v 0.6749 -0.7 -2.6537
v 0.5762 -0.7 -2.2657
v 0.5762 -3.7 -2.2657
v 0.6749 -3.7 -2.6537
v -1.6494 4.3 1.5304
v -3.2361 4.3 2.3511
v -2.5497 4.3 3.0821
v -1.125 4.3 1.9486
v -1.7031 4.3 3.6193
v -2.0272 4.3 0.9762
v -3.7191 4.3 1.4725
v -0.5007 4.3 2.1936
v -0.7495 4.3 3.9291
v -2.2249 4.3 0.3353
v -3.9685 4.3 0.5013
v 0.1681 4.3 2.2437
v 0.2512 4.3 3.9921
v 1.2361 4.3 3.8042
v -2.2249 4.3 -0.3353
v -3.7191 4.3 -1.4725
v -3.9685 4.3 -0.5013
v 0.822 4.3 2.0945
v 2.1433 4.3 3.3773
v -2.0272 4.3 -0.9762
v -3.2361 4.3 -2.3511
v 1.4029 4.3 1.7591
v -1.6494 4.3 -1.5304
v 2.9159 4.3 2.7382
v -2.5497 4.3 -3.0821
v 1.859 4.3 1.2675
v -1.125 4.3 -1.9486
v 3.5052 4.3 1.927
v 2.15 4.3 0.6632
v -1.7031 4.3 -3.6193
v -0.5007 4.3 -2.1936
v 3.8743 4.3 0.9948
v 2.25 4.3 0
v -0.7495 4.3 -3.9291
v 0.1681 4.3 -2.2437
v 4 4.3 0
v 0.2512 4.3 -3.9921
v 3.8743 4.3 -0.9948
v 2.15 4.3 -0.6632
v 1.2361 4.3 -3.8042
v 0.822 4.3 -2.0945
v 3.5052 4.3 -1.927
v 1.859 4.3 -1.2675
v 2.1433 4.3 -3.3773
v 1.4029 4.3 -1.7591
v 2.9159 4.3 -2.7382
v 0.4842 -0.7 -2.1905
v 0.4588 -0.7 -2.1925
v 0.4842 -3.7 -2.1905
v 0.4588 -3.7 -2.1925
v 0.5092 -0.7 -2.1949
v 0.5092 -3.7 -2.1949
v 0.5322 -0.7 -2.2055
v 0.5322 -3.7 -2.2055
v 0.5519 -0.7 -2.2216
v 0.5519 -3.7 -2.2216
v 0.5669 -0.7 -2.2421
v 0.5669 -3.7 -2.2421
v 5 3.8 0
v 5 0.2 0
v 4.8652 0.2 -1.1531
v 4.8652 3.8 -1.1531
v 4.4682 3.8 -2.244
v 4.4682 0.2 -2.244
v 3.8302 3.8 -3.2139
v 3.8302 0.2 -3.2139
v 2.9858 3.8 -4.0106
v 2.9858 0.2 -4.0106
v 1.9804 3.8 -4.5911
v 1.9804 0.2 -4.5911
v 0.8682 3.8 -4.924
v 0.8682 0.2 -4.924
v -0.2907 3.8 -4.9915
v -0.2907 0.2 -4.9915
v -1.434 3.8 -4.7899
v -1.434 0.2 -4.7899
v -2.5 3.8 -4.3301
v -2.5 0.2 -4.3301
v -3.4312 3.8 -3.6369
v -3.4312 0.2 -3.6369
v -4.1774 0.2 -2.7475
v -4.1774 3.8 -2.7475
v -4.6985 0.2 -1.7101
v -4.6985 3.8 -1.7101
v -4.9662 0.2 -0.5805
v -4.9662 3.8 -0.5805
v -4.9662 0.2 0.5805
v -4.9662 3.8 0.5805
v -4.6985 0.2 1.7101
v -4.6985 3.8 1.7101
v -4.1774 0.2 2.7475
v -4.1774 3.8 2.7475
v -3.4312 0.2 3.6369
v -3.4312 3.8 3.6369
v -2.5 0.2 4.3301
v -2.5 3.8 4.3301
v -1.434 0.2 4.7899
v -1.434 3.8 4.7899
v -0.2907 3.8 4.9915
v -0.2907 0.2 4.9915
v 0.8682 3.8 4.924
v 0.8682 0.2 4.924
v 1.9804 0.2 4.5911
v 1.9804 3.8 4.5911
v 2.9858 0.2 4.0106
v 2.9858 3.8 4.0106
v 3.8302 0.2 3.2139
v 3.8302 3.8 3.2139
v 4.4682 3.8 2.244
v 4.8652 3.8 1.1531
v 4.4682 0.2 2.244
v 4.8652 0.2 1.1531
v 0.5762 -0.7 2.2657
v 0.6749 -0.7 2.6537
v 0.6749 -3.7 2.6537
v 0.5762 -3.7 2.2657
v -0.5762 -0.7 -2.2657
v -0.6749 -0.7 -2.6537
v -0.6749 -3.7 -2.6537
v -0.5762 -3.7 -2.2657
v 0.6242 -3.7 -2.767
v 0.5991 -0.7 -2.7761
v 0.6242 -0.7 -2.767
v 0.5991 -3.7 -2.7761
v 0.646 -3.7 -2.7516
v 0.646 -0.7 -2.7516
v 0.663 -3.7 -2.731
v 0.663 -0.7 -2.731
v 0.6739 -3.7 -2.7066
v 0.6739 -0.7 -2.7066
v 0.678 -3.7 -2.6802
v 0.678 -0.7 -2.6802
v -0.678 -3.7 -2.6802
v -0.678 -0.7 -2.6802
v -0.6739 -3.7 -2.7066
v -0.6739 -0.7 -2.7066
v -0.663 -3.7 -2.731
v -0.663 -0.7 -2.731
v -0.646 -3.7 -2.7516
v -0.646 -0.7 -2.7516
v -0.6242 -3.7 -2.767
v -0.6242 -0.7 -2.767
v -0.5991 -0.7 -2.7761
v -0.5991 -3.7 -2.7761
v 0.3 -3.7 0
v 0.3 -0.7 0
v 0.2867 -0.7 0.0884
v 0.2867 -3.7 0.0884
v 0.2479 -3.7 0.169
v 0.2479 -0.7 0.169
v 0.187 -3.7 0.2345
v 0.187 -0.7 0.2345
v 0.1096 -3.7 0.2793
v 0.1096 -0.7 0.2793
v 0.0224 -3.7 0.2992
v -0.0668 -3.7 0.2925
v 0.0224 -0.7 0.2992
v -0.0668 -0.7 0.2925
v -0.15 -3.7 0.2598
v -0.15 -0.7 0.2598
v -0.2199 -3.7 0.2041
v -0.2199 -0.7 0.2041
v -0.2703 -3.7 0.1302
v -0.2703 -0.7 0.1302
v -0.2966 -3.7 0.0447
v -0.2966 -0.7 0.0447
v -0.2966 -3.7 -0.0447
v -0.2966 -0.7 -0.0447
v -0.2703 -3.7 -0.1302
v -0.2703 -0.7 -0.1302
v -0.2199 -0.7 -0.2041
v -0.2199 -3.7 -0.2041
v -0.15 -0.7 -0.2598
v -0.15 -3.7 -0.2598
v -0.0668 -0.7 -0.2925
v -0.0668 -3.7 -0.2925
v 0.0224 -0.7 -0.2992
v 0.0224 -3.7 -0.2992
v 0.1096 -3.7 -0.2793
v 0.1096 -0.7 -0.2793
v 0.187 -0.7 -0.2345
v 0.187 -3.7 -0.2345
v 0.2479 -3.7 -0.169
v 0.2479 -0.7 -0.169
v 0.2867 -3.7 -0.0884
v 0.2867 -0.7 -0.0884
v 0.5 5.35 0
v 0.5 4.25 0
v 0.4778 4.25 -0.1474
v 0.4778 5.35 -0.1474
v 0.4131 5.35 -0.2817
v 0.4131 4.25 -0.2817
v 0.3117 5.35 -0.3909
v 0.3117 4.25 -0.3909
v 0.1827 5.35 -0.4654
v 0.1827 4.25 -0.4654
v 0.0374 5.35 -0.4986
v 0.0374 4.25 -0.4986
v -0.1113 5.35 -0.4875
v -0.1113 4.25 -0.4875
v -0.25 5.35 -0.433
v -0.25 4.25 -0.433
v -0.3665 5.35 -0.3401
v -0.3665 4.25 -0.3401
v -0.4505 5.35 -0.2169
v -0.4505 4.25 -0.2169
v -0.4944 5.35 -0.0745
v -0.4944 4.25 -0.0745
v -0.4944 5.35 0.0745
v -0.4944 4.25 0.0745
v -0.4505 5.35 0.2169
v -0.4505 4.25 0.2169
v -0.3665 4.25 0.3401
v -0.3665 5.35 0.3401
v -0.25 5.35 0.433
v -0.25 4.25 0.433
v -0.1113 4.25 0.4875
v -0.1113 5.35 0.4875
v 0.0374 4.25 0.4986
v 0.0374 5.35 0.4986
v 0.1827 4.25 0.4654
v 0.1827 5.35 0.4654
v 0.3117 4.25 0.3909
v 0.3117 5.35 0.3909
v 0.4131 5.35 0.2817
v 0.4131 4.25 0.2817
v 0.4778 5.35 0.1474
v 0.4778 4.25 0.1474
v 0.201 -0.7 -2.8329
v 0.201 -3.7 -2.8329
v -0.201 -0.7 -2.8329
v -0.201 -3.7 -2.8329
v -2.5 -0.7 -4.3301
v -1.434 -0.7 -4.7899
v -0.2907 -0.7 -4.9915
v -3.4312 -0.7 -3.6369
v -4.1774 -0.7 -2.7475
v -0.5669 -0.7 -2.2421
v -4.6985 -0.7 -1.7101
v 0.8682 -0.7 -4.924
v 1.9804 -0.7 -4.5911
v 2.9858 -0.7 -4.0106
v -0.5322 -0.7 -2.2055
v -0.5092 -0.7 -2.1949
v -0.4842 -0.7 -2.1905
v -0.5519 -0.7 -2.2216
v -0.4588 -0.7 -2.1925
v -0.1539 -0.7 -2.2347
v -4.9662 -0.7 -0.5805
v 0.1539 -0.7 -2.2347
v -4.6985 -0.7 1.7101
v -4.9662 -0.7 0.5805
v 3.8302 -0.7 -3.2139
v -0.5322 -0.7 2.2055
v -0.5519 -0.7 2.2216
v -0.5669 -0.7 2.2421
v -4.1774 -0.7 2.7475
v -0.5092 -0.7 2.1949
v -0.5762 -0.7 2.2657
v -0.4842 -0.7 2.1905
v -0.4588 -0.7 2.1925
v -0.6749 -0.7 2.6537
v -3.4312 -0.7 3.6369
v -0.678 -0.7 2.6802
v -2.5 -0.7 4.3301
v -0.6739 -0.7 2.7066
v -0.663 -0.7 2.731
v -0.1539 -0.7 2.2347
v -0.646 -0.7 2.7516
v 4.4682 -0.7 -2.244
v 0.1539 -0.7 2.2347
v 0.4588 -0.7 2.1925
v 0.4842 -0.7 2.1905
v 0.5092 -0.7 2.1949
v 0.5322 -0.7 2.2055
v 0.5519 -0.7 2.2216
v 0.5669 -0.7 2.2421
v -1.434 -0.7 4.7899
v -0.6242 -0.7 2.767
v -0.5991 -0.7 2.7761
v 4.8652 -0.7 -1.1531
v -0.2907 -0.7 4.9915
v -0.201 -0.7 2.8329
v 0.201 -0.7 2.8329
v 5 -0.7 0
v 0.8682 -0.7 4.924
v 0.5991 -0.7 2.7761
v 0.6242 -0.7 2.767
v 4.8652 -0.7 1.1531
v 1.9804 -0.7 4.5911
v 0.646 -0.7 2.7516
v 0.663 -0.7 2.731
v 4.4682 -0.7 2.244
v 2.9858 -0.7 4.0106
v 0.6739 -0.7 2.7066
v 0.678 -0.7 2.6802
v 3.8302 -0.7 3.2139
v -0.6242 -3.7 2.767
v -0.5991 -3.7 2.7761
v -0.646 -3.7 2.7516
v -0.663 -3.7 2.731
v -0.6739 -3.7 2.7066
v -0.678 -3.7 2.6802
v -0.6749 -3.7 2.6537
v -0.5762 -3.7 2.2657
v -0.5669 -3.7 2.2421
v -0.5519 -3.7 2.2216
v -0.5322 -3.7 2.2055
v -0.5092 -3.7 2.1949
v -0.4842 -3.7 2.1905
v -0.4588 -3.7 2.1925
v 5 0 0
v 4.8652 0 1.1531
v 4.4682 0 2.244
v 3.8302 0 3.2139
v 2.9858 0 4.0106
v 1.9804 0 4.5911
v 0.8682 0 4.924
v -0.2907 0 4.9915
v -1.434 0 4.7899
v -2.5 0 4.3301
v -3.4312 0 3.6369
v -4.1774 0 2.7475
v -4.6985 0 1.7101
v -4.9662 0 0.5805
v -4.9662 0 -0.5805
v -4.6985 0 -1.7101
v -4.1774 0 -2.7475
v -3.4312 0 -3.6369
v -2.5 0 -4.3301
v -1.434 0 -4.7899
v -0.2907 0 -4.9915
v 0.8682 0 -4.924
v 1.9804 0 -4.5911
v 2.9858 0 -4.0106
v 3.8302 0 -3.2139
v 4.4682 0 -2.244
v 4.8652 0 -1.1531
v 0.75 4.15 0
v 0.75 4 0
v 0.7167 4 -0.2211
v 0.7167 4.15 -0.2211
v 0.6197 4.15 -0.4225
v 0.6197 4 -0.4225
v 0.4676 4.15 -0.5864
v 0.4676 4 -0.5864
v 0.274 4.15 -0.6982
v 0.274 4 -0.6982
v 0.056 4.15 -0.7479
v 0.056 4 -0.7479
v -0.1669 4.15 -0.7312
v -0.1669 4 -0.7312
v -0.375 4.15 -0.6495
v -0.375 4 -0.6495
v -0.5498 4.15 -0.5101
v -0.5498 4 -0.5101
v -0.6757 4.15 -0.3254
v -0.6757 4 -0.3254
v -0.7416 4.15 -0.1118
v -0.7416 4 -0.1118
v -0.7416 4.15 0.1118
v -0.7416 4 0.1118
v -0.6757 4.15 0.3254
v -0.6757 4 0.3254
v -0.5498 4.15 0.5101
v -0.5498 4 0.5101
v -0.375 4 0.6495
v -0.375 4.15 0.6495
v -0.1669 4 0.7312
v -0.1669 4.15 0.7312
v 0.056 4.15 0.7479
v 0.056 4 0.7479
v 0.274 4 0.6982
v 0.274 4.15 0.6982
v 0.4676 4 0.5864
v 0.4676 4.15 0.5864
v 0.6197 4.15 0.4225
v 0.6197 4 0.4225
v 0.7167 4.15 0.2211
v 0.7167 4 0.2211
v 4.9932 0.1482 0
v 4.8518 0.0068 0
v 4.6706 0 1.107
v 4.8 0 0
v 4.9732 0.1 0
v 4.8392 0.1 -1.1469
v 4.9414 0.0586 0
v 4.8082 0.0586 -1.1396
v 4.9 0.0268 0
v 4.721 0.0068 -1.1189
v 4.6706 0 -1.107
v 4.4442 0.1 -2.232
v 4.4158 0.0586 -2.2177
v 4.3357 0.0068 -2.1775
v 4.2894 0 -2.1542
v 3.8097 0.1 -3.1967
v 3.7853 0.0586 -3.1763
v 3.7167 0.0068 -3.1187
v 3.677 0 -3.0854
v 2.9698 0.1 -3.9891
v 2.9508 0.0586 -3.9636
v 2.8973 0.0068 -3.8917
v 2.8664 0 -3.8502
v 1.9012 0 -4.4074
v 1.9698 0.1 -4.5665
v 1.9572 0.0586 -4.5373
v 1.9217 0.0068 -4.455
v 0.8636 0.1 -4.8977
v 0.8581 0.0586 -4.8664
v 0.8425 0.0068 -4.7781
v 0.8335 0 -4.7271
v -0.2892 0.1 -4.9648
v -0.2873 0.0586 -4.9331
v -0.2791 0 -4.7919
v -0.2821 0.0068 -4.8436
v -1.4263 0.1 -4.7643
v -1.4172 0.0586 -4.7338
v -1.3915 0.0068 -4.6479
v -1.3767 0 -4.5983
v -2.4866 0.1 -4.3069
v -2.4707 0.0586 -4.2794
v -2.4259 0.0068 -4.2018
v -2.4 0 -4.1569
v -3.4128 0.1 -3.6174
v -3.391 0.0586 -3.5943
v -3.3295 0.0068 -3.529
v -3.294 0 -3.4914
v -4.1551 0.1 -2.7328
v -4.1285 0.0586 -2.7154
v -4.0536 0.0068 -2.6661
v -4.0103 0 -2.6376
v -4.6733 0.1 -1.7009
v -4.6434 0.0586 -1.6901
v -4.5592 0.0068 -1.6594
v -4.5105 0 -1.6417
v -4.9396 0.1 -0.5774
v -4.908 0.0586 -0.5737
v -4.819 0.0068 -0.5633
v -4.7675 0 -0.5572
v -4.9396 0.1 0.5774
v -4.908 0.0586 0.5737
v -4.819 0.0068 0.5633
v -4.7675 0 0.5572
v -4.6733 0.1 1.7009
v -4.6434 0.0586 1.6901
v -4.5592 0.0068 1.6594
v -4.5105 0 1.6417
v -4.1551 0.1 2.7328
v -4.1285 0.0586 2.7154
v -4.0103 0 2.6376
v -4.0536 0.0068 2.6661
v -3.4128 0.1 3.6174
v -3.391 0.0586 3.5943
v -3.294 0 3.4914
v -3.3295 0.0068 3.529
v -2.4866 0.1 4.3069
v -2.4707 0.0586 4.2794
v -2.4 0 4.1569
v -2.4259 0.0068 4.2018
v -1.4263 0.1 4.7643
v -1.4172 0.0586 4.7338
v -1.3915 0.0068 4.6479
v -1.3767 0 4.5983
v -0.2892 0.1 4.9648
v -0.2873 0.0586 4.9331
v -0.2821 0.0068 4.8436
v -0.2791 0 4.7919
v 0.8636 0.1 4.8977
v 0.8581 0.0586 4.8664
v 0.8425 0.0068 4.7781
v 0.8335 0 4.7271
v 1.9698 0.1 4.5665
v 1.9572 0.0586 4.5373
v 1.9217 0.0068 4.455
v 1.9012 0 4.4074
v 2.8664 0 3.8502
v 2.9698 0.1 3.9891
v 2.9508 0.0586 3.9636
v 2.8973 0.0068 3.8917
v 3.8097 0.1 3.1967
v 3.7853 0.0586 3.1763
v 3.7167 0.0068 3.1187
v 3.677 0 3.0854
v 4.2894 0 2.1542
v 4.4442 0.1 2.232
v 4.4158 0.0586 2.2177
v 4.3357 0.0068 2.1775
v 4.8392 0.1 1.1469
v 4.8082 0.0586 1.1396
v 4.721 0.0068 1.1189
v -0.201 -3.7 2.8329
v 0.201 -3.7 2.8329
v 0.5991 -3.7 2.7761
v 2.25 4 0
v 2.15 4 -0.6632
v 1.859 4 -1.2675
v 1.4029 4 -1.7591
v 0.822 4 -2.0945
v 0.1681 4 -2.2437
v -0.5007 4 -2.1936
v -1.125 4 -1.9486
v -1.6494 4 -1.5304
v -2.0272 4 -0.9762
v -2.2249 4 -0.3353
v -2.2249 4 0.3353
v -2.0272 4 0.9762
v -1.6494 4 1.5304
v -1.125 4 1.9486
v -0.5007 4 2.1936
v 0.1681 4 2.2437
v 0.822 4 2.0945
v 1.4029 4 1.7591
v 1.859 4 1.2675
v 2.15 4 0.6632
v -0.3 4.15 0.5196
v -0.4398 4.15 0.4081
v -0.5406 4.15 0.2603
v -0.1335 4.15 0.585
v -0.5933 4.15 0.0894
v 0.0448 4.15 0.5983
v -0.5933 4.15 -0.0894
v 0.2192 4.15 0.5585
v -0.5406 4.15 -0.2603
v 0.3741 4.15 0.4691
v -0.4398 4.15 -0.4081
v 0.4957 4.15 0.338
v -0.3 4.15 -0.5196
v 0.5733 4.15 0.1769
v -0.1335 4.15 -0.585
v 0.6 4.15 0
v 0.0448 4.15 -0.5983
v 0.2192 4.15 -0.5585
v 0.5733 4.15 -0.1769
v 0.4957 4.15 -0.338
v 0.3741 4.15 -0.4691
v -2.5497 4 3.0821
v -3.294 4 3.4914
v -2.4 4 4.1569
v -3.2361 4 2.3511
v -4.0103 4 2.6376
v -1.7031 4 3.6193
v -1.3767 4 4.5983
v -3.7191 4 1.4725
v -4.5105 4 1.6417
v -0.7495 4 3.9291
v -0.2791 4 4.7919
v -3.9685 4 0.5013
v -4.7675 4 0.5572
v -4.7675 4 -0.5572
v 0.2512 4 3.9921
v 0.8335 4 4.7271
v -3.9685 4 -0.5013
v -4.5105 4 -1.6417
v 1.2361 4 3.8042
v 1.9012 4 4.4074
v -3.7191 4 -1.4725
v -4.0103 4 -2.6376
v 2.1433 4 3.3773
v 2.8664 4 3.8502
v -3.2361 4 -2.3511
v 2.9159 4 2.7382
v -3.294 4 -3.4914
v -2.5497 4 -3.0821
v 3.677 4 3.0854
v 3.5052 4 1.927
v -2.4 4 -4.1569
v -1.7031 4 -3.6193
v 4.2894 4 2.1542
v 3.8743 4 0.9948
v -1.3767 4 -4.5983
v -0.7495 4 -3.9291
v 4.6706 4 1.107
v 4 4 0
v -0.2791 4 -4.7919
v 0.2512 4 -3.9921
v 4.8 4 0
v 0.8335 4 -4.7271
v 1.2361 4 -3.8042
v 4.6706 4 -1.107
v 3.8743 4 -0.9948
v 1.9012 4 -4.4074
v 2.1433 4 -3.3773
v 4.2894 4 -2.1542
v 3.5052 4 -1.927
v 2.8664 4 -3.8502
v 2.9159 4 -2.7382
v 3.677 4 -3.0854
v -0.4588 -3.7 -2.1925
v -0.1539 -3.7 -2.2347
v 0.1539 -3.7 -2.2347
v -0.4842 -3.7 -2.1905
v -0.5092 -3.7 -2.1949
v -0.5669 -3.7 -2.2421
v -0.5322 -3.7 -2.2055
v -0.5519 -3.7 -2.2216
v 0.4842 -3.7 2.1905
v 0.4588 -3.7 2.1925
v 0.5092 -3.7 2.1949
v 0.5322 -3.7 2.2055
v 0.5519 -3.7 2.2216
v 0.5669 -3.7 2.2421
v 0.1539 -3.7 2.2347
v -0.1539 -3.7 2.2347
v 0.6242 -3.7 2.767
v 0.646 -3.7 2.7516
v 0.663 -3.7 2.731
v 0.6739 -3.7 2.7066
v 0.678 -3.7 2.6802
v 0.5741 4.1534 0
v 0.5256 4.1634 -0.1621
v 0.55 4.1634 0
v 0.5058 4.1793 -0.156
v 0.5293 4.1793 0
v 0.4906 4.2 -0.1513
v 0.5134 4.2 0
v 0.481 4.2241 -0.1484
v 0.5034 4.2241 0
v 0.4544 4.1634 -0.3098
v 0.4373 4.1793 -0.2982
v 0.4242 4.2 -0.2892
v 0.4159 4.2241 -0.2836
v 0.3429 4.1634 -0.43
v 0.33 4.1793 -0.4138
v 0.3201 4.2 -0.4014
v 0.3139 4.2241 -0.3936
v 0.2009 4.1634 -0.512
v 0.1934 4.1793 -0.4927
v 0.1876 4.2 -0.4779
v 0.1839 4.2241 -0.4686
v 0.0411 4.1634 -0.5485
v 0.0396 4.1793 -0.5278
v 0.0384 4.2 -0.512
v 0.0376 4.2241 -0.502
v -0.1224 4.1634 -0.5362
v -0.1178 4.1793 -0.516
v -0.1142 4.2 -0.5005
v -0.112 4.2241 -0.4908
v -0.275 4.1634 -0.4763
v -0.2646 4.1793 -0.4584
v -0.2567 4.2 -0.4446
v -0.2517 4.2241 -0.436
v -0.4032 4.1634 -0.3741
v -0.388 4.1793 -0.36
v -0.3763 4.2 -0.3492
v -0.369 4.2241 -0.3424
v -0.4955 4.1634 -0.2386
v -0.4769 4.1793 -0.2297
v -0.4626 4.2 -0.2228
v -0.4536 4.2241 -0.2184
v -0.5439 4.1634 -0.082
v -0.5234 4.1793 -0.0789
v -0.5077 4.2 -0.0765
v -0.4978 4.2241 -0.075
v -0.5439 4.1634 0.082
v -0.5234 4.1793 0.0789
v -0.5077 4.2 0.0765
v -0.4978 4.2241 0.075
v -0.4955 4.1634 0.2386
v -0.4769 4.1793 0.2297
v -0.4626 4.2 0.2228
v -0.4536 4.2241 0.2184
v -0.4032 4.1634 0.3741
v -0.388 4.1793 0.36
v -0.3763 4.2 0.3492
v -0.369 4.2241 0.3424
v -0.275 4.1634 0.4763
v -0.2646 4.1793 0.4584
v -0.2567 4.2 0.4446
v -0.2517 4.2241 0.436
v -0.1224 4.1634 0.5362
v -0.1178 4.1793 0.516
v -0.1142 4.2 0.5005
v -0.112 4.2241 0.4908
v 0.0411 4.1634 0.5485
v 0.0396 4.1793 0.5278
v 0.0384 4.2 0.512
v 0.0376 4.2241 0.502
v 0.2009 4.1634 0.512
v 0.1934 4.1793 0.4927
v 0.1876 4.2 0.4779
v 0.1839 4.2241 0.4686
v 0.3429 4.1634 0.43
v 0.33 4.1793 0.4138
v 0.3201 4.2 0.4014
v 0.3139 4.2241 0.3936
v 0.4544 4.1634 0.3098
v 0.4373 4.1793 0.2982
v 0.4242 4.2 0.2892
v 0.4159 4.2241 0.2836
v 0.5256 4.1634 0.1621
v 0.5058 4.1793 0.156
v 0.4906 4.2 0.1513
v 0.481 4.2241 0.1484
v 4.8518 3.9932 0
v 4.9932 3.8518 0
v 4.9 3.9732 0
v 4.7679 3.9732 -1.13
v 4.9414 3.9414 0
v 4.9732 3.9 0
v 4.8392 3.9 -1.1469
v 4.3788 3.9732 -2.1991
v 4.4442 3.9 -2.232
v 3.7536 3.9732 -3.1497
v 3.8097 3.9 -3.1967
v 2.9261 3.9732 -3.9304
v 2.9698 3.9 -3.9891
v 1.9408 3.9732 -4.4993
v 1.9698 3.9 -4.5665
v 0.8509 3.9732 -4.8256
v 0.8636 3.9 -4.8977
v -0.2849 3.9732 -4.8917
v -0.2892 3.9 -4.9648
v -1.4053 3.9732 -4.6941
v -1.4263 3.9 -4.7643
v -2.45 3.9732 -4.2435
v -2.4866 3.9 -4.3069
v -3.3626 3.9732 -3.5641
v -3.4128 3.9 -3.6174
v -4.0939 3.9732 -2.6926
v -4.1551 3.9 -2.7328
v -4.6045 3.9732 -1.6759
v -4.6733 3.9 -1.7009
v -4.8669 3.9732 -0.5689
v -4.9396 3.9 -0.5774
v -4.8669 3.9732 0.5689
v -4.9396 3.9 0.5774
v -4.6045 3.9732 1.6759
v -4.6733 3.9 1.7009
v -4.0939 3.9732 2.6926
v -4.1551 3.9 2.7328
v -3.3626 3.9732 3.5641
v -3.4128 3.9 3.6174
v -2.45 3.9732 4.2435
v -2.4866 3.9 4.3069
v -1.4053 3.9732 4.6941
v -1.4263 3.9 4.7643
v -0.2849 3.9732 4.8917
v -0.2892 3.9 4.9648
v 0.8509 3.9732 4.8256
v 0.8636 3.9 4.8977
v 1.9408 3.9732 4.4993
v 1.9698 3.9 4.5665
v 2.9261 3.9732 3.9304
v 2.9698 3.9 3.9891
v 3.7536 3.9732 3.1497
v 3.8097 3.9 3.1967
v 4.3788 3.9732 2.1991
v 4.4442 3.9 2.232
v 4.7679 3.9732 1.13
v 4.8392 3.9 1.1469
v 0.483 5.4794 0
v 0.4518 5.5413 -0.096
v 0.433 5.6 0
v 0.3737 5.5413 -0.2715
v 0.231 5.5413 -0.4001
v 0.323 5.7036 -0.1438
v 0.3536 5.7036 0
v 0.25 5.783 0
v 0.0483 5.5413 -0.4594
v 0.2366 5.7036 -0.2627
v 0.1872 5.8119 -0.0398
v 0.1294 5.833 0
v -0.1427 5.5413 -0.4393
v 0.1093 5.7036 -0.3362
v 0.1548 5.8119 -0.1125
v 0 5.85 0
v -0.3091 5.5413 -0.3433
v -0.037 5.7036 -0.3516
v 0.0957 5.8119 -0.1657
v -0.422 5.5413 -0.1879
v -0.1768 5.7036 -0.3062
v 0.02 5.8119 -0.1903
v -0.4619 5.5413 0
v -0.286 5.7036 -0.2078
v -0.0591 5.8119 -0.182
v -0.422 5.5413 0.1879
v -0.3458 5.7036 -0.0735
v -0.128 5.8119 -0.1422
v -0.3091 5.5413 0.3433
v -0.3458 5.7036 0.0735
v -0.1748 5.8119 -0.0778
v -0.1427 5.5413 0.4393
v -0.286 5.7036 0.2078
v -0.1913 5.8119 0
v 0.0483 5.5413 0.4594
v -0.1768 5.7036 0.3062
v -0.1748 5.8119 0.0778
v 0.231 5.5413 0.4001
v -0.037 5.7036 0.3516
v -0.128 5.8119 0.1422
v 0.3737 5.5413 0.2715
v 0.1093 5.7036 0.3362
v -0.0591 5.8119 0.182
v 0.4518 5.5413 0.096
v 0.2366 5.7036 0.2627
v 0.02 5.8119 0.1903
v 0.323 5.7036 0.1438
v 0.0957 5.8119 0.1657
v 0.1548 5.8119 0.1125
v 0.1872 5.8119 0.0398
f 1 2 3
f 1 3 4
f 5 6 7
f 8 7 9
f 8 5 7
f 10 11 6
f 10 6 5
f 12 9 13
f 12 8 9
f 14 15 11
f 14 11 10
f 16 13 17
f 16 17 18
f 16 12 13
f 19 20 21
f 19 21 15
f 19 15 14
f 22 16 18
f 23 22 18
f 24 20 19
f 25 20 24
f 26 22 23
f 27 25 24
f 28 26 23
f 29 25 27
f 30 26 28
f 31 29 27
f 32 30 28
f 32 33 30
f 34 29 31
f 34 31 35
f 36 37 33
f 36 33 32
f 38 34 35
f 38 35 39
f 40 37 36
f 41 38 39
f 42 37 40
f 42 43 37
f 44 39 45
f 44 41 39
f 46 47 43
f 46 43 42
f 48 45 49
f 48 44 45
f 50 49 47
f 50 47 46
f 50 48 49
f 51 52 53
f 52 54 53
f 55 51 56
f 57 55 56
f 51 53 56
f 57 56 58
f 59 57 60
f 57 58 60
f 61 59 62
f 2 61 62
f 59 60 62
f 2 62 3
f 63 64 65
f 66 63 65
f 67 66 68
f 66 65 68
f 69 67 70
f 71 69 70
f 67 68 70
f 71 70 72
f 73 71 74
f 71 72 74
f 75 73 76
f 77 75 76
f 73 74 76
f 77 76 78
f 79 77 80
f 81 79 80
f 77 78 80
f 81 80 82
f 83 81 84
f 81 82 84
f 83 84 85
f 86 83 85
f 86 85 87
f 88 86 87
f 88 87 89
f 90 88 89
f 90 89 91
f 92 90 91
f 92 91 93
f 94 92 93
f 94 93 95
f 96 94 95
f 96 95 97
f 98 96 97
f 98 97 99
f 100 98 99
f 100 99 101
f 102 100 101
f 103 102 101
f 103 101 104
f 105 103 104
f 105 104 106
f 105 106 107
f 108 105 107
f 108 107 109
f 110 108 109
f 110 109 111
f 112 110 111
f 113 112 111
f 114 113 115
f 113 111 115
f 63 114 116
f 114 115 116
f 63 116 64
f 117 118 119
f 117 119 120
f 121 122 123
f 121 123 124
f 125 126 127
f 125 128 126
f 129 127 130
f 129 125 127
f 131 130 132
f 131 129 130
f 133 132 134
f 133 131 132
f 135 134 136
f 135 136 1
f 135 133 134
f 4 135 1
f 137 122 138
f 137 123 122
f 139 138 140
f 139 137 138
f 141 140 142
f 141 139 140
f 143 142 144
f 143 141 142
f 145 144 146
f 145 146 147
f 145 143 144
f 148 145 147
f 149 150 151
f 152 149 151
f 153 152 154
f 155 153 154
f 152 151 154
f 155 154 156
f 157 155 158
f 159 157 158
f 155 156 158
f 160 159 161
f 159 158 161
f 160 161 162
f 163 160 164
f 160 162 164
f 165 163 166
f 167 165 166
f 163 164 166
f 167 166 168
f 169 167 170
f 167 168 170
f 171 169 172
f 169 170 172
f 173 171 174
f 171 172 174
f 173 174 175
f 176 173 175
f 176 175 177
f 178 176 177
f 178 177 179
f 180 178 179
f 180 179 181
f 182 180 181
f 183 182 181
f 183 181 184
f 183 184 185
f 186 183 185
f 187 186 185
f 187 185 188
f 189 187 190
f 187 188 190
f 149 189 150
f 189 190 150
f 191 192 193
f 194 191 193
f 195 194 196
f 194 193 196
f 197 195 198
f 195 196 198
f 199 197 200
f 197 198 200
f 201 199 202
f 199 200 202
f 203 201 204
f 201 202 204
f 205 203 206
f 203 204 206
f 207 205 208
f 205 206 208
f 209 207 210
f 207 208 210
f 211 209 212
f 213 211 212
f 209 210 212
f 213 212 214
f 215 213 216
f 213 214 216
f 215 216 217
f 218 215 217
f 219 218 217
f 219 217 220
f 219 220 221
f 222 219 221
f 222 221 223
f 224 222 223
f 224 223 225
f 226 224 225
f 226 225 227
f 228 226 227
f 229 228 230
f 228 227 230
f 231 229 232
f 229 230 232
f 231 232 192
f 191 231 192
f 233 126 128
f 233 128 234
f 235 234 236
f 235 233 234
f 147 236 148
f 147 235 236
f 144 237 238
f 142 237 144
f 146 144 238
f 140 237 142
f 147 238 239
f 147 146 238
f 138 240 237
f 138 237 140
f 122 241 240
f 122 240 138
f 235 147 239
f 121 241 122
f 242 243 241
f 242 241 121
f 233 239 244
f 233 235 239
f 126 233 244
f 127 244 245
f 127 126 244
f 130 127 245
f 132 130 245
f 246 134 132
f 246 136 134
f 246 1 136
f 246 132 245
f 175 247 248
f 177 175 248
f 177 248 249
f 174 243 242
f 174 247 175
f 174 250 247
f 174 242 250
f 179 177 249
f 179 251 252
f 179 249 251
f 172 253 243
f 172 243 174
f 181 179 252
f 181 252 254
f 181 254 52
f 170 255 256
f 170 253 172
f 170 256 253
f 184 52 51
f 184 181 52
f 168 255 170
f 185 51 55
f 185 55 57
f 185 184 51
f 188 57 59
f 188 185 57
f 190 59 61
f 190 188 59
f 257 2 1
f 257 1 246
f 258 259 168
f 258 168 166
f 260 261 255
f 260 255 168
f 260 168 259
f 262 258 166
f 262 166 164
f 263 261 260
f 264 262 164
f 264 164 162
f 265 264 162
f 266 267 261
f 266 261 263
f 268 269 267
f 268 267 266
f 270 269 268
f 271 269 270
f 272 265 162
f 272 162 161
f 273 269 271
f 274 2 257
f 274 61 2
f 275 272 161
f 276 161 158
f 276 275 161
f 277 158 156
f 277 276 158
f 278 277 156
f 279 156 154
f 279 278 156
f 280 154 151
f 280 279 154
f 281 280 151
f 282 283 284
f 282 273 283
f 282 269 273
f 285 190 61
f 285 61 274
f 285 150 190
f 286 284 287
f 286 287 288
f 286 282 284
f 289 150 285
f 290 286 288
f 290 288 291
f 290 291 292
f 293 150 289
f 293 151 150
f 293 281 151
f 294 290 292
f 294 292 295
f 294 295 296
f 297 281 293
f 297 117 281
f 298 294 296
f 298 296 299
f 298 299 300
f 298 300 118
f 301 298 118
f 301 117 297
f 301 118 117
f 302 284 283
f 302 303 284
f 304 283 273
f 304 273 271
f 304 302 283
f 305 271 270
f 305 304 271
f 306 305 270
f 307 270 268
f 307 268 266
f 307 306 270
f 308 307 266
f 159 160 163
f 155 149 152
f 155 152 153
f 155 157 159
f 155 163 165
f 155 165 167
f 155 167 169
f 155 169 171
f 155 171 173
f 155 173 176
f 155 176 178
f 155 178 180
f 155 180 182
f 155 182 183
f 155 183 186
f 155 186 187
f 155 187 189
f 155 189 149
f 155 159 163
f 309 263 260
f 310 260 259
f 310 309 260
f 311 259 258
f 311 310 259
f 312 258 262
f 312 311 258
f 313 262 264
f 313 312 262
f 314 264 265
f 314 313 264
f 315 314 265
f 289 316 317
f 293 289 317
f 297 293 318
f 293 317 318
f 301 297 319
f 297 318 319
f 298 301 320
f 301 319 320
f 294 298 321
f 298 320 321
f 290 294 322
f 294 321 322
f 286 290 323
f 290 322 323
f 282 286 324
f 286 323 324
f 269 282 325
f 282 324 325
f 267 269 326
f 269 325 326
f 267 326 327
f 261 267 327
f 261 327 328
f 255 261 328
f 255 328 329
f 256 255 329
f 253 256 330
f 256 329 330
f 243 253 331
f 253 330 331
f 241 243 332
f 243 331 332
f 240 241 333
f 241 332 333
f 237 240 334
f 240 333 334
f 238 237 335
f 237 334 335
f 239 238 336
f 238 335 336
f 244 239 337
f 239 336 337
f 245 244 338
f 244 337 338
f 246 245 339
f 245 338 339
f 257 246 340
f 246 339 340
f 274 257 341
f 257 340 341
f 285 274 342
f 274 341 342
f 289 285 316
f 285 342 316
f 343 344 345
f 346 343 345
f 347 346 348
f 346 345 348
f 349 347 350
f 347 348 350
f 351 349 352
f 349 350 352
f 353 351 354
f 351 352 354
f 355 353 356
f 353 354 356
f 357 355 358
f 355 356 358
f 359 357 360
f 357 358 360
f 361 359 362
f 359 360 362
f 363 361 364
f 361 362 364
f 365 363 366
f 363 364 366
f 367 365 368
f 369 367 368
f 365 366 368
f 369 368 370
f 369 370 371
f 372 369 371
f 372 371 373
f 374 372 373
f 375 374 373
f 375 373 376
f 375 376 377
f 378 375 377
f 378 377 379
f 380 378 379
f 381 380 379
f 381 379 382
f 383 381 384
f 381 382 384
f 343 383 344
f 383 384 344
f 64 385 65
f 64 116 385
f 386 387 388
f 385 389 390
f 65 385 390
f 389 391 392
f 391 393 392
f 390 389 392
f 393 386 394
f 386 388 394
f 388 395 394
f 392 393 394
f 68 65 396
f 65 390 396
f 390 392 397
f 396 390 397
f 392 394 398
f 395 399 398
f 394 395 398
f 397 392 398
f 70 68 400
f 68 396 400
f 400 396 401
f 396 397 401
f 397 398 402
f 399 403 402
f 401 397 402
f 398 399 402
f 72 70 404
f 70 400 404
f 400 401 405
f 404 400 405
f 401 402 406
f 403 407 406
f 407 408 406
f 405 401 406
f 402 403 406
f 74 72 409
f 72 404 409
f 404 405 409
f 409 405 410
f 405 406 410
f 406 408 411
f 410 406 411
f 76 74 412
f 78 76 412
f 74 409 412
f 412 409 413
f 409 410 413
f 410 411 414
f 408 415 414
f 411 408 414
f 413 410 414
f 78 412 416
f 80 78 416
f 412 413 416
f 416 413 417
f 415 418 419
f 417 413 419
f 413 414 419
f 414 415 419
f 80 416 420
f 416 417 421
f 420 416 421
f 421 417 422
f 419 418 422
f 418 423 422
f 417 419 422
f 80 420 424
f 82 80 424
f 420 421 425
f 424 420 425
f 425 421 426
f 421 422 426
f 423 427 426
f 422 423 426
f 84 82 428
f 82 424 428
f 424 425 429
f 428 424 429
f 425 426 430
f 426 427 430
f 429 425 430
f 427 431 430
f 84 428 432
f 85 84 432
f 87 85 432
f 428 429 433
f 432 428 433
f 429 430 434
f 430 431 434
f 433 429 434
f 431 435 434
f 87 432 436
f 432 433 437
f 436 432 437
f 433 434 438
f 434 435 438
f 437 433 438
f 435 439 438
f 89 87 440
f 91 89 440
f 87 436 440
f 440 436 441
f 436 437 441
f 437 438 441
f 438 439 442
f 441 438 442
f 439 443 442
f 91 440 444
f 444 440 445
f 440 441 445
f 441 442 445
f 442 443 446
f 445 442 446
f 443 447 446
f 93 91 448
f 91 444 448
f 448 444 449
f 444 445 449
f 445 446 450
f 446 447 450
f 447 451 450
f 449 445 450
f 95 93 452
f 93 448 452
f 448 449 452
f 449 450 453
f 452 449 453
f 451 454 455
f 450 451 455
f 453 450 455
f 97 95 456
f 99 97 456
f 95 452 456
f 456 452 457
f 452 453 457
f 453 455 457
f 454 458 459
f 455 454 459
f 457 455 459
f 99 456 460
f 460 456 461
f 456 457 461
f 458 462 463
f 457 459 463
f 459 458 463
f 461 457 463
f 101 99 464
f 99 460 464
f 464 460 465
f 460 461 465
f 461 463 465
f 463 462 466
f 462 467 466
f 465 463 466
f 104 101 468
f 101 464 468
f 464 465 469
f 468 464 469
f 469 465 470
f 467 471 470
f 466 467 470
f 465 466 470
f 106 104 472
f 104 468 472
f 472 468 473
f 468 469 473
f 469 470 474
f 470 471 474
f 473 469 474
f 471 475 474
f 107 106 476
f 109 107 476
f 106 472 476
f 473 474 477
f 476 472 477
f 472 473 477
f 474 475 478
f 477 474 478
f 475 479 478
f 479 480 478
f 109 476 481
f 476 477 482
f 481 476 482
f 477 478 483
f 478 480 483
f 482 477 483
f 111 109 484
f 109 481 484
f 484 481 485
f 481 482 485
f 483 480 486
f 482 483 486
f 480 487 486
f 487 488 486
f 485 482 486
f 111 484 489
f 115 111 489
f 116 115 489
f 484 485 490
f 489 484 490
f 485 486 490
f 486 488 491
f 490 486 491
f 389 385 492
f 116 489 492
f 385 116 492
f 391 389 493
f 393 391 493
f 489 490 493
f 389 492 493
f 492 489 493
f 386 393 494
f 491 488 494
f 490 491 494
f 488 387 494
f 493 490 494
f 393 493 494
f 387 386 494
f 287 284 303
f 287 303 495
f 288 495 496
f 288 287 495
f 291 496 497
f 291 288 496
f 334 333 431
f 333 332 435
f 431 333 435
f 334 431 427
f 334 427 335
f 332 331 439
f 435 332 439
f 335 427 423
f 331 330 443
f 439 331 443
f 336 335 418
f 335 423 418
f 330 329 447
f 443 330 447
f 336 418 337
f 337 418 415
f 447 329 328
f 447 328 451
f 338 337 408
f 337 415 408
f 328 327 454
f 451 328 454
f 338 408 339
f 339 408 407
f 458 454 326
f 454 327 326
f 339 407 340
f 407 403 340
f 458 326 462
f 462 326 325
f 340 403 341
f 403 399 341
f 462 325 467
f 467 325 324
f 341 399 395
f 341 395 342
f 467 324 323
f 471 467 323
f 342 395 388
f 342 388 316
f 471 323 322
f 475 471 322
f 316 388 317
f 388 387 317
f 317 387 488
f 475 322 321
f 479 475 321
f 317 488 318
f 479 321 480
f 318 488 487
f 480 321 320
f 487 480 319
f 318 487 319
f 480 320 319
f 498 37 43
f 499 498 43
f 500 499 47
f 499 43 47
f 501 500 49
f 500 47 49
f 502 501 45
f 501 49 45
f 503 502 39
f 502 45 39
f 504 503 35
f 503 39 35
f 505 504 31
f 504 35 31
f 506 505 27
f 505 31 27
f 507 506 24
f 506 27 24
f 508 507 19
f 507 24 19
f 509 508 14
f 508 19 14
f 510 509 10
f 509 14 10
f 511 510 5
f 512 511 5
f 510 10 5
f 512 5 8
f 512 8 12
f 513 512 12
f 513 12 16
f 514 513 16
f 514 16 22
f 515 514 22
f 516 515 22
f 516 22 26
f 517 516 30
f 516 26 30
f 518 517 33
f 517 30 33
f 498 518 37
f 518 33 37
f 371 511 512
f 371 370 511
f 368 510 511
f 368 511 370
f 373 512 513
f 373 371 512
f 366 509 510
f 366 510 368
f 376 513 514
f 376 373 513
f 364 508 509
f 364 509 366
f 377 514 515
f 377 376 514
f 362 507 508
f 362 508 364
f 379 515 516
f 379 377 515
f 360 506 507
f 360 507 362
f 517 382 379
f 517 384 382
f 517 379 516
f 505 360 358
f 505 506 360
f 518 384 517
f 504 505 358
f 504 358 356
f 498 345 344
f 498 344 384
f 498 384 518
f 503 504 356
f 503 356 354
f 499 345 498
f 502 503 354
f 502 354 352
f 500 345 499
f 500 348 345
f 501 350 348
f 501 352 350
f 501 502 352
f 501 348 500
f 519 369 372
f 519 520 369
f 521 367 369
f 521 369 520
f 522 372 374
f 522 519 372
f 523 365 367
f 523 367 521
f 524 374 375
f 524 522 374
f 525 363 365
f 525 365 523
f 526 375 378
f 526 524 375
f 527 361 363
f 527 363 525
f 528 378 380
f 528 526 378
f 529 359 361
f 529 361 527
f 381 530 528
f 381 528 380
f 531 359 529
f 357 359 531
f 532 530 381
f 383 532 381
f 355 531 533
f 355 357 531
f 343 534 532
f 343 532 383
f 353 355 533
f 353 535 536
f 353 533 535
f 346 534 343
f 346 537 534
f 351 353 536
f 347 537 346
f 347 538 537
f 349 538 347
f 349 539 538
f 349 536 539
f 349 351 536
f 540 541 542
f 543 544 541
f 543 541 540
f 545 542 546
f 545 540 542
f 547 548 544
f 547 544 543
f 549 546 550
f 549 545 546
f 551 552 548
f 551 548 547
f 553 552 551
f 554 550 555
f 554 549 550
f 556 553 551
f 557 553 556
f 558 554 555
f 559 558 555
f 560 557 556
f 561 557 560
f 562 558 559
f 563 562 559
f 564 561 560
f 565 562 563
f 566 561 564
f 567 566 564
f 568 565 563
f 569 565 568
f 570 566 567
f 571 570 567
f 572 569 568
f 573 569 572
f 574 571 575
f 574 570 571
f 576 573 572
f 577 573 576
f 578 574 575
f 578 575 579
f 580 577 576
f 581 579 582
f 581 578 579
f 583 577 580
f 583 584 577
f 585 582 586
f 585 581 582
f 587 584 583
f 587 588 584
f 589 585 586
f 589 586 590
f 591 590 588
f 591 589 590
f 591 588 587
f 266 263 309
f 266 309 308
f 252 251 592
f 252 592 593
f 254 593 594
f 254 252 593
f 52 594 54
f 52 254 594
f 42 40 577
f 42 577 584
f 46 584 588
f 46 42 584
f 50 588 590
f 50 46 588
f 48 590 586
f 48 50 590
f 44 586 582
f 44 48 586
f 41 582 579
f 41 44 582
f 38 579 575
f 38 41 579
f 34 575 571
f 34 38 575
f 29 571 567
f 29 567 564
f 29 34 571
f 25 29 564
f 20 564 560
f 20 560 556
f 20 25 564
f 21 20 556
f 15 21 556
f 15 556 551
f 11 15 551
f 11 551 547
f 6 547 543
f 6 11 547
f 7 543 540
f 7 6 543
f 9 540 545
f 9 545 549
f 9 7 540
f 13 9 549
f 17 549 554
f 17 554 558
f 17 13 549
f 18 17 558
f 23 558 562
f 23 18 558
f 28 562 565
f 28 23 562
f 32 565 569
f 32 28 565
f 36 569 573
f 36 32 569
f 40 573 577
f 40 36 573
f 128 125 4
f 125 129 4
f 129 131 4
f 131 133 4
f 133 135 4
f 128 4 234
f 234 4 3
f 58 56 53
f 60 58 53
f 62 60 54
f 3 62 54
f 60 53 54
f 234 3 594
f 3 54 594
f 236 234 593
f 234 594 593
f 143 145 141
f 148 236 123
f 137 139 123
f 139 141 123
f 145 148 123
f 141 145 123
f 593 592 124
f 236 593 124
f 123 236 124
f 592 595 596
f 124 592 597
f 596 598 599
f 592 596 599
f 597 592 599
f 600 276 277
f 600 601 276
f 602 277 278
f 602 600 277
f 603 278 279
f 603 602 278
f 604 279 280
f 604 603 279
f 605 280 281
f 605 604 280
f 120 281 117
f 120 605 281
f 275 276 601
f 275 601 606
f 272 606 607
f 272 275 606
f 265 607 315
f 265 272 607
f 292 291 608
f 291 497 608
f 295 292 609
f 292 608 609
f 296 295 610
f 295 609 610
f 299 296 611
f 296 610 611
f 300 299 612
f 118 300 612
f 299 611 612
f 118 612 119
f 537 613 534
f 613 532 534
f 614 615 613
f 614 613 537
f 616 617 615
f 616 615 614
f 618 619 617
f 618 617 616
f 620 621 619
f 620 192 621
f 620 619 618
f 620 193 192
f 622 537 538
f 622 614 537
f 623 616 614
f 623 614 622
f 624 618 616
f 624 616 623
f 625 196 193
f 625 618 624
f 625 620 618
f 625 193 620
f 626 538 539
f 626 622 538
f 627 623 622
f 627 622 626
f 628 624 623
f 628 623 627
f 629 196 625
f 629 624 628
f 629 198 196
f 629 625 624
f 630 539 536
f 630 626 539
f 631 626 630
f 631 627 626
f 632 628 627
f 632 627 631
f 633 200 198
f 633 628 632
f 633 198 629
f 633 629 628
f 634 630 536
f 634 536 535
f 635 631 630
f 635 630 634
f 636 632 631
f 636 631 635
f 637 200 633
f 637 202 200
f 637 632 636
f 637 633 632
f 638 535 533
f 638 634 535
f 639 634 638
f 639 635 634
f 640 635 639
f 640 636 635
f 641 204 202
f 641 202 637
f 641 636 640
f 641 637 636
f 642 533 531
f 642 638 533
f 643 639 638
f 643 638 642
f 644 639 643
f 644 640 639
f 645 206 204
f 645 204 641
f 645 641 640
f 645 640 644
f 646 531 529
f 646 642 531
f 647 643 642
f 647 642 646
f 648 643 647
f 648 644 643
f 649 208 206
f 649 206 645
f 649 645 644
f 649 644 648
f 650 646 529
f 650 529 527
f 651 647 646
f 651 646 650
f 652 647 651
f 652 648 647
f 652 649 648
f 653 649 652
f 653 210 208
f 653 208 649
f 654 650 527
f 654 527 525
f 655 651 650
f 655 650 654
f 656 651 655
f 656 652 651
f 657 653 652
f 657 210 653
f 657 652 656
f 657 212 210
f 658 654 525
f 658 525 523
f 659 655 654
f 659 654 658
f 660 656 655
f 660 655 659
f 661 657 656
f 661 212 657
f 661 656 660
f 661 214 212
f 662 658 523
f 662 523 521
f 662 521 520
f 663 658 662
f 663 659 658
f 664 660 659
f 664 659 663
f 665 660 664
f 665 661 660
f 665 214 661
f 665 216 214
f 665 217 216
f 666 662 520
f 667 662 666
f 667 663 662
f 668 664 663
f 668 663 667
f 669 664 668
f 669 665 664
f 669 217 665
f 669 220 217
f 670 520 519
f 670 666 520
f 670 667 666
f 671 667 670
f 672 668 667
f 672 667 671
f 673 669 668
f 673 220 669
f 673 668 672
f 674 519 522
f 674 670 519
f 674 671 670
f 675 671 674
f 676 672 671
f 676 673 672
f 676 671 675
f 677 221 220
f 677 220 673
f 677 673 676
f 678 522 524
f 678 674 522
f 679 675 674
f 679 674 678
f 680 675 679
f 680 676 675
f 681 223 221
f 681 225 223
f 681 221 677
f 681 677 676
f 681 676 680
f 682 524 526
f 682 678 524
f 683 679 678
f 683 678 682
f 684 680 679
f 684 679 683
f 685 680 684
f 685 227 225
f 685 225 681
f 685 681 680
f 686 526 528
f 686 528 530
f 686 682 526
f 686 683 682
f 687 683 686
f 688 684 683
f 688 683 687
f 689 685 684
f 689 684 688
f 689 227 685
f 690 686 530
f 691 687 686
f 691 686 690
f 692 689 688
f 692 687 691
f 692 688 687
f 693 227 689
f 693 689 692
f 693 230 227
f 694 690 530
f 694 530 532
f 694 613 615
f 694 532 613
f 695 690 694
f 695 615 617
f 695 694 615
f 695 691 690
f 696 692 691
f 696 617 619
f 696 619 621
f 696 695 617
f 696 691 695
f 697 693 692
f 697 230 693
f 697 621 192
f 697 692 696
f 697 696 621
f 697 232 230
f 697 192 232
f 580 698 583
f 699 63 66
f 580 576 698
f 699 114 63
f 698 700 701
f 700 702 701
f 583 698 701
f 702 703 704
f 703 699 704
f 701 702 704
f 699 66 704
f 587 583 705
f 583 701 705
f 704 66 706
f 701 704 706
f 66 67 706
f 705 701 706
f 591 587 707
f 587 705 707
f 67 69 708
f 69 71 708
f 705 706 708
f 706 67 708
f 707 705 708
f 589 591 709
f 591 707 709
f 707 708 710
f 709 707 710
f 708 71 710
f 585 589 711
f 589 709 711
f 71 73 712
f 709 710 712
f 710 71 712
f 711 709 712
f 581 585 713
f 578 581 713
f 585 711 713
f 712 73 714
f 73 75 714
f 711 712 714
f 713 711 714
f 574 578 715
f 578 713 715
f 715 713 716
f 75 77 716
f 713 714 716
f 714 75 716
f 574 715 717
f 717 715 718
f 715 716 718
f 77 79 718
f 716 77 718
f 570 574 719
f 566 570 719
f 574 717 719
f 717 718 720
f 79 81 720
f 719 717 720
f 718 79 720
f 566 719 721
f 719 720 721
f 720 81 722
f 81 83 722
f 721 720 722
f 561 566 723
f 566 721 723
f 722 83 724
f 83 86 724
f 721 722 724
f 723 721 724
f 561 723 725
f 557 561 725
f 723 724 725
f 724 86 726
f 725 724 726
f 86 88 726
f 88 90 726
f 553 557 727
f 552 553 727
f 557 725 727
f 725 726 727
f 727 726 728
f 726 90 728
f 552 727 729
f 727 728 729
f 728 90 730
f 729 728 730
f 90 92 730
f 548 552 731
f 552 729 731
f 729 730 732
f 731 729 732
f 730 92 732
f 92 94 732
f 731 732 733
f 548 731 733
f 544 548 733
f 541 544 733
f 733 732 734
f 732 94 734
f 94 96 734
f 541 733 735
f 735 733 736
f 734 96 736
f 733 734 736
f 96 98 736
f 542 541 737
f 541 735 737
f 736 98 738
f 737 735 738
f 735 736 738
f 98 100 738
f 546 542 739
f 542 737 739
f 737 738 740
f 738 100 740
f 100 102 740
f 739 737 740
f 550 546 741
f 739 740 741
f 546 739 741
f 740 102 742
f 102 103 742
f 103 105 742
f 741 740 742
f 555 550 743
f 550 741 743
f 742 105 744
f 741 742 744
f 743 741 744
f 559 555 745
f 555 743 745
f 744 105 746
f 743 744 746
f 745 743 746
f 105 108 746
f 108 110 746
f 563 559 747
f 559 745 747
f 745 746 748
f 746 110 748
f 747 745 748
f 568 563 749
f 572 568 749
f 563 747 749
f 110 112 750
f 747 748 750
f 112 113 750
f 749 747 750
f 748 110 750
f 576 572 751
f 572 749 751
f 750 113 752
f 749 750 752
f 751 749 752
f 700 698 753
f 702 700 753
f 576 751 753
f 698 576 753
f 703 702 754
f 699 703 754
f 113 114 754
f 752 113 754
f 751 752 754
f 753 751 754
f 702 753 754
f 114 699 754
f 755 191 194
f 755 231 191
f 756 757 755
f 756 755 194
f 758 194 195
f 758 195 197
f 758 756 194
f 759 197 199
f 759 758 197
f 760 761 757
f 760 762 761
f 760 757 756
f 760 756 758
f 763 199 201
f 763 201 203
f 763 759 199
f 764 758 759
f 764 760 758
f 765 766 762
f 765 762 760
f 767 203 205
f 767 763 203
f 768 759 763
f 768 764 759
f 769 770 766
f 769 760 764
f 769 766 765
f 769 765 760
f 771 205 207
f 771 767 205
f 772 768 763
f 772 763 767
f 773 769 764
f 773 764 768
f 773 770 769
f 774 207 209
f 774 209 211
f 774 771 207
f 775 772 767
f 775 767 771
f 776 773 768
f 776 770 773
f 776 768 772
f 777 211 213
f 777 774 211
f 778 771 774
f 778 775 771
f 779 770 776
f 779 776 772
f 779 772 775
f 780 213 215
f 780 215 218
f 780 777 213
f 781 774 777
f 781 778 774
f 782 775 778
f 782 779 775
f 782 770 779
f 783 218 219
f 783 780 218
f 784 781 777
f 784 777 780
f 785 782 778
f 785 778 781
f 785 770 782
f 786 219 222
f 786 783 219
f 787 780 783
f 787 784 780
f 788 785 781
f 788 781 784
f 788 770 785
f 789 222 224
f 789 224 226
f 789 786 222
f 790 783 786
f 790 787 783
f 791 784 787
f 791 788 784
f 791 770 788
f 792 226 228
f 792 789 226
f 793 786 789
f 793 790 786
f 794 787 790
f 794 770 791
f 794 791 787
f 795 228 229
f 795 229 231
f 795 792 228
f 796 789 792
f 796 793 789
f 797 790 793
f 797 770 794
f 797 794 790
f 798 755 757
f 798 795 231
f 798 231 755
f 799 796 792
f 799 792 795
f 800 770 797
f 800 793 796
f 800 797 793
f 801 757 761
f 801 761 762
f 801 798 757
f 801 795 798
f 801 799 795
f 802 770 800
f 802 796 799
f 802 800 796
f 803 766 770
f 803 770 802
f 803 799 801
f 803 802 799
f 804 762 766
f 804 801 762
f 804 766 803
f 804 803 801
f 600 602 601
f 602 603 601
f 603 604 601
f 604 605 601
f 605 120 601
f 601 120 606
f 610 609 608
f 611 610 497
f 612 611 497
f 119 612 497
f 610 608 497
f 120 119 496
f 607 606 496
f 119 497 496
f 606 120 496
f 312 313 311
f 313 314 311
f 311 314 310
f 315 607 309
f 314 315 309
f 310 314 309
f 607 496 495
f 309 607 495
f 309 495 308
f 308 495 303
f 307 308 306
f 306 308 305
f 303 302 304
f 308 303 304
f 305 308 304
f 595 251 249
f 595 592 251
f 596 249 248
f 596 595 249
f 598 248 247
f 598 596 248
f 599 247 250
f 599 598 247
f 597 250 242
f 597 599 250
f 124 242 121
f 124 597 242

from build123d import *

# Parameters (mm, degrees)
SKETCH_1_R          = 5
EXTRUDE_1_DEPTH     = 4.3
SKETCH_2_R          = 5
SKETCH_2_R_2        = 4
SKETCH_2_R_3        = 2.25
CUT_EXTRUDE_1_DEPTH = 0.3
SKETCH_3_R          = 0.75
EXTRUDE_2_DEPTH     = 0.15
SKETCH_4_R          = 0.5
EXTRUDE_3_DEPTH     = 1.7
FILLET_1_R          = 0.5
FILLET_2_R          = 0.2
FILLET_3_R          = 0.1
SKETCH_5_R          = 5
EXTRUDE_4_DEPTH     = 0.7
EXTRUDE_5_DEPTH     = 3
FILLET_4_R          = 0.1
SKETCH_7_R          = 0.3
EXTRUDE_6_DEPTH     = 3


with BuildPart() as part:
    # Эскиз1 → Бобышка-Вытянуть1 (new body)
    with BuildSketch(Plane(origin=(0, 0, 0), x_dir=(1, 0, 0), z_dir=(0, 1, 0))):
        Circle(SKETCH_1_R)
    extrude(amount=EXTRUDE_1_DEPTH)

    # Эскиз2 → Вырез-Вытянуть1 (cut)
    with BuildSketch(Plane(origin=(0, 4.3, 0), x_dir=(1, 0, 0), z_dir=(0, 1, 0))):
        Circle(SKETCH_2_R)
        Circle(SKETCH_2_R_2, mode=Mode.SUBTRACT)
        Circle(SKETCH_2_R_3)
    extrude(amount=-CUT_EXTRUDE_1_DEPTH, mode=Mode.SUBTRACT)

    # Эскиз3 → Бобышка-Вытянуть2 (add)
    with BuildSketch(Plane(origin=(0, 4, 0), x_dir=(1, 0, 0), z_dir=(0, 1, 0))):
        Circle(SKETCH_3_R)
    extrude(amount=EXTRUDE_2_DEPTH)

    # Эскиз4 → Бобышка-Вытянуть3 (add)
    with BuildSketch(Plane(origin=(0, 4.15, 0), x_dir=(1, 0, 0), z_dir=(0, 1, 0))):
        Circle(SKETCH_4_R)
    extrude(amount=EXTRUDE_3_DEPTH)

    # Скругление1
    fillet_1_edges = [part.edges().sort_by_distance(p)[0] for p in [
        (-0.5, 5.85, 0),
    ]]
    fillet(fillet_1_edges, radius=FILLET_1_R)

    # Скругление2
    fillet_2_edges = [part.edges().sort_by_distance(p)[0] for p in [
        (-5, 0, 0),
        (-5, 4, 0),
    ]]
    fillet(fillet_2_edges, radius=FILLET_2_R)

    # Скругление3
    fillet_3_edges = [part.edges().sort_by_distance(p)[0] for p in [
        (-0.5, 4.15, 0),
    ]]
    fillet(fillet_3_edges, radius=FILLET_3_R)

    # Эскиз5 → Бобышка-Вытянуть4 (add)
    with BuildSketch(Plane.XZ):
        Circle(SKETCH_5_R)
    extrude(amount=EXTRUDE_4_DEPTH)

    # Эскиз6 → Бобышка-Вытянуть5 (add)
    with BuildSketch(Plane.XZ.offset(0.7)):
        with BuildLine():
            Line((0.7, 2.752380788), (0.552112676, 2.170891889))
            ThreePointArc((0.552112676, 2.170891889), (0, 2.24), (-0.552112676, 2.170891889))
            Line((-0.552112676, 2.170891889), (-0.7, 2.752380788))
            ThreePointArc((-0.7, 2.752380788), (0, 2.84), (0.7, 2.752380788))
        make_face()
        with BuildLine():
            Line((0.552112676, -2.170891889), (0.7, -2.752380788))
            ThreePointArc((0.7, -2.752380788), (0, -2.84), (-0.7, -2.752380788))
            Line((-0.7, -2.752380788), (-0.552112676, -2.170891889))
            ThreePointArc((-0.552112676, -2.170891889), (0, -2.24), (0.552112676, -2.170891889))
        make_face()
    extrude(amount=EXTRUDE_5_DEPTH)

    # Скругление4
    fillet_4_edges = [part.edges().sort_by_distance(p)[0] for p in [
        (0.7, -2.2, 2.752380788),
        (-0.7, -2.2, 2.752380788),
        (-0.552112676, -2.2, 2.170891889),
        (0.552112676, -2.2, 2.170891889),
        (-0.7, -2.2, -2.752380788),
        (0.7, -2.2, -2.752380788),
        (0.552112676, -2.2, -2.170891889),
        (-0.552112676, -2.2, -2.170891889),
    ]]
    fillet(fillet_4_edges, radius=FILLET_4_R)

    # Эскиз7 → Бобышка-Вытянуть6 (add)
    with BuildSketch(Plane.XZ.offset(0.7)):
        Circle(SKETCH_7_R)
    extrude(amount=EXTRUDE_6_DEPTH)


solid = part.part
